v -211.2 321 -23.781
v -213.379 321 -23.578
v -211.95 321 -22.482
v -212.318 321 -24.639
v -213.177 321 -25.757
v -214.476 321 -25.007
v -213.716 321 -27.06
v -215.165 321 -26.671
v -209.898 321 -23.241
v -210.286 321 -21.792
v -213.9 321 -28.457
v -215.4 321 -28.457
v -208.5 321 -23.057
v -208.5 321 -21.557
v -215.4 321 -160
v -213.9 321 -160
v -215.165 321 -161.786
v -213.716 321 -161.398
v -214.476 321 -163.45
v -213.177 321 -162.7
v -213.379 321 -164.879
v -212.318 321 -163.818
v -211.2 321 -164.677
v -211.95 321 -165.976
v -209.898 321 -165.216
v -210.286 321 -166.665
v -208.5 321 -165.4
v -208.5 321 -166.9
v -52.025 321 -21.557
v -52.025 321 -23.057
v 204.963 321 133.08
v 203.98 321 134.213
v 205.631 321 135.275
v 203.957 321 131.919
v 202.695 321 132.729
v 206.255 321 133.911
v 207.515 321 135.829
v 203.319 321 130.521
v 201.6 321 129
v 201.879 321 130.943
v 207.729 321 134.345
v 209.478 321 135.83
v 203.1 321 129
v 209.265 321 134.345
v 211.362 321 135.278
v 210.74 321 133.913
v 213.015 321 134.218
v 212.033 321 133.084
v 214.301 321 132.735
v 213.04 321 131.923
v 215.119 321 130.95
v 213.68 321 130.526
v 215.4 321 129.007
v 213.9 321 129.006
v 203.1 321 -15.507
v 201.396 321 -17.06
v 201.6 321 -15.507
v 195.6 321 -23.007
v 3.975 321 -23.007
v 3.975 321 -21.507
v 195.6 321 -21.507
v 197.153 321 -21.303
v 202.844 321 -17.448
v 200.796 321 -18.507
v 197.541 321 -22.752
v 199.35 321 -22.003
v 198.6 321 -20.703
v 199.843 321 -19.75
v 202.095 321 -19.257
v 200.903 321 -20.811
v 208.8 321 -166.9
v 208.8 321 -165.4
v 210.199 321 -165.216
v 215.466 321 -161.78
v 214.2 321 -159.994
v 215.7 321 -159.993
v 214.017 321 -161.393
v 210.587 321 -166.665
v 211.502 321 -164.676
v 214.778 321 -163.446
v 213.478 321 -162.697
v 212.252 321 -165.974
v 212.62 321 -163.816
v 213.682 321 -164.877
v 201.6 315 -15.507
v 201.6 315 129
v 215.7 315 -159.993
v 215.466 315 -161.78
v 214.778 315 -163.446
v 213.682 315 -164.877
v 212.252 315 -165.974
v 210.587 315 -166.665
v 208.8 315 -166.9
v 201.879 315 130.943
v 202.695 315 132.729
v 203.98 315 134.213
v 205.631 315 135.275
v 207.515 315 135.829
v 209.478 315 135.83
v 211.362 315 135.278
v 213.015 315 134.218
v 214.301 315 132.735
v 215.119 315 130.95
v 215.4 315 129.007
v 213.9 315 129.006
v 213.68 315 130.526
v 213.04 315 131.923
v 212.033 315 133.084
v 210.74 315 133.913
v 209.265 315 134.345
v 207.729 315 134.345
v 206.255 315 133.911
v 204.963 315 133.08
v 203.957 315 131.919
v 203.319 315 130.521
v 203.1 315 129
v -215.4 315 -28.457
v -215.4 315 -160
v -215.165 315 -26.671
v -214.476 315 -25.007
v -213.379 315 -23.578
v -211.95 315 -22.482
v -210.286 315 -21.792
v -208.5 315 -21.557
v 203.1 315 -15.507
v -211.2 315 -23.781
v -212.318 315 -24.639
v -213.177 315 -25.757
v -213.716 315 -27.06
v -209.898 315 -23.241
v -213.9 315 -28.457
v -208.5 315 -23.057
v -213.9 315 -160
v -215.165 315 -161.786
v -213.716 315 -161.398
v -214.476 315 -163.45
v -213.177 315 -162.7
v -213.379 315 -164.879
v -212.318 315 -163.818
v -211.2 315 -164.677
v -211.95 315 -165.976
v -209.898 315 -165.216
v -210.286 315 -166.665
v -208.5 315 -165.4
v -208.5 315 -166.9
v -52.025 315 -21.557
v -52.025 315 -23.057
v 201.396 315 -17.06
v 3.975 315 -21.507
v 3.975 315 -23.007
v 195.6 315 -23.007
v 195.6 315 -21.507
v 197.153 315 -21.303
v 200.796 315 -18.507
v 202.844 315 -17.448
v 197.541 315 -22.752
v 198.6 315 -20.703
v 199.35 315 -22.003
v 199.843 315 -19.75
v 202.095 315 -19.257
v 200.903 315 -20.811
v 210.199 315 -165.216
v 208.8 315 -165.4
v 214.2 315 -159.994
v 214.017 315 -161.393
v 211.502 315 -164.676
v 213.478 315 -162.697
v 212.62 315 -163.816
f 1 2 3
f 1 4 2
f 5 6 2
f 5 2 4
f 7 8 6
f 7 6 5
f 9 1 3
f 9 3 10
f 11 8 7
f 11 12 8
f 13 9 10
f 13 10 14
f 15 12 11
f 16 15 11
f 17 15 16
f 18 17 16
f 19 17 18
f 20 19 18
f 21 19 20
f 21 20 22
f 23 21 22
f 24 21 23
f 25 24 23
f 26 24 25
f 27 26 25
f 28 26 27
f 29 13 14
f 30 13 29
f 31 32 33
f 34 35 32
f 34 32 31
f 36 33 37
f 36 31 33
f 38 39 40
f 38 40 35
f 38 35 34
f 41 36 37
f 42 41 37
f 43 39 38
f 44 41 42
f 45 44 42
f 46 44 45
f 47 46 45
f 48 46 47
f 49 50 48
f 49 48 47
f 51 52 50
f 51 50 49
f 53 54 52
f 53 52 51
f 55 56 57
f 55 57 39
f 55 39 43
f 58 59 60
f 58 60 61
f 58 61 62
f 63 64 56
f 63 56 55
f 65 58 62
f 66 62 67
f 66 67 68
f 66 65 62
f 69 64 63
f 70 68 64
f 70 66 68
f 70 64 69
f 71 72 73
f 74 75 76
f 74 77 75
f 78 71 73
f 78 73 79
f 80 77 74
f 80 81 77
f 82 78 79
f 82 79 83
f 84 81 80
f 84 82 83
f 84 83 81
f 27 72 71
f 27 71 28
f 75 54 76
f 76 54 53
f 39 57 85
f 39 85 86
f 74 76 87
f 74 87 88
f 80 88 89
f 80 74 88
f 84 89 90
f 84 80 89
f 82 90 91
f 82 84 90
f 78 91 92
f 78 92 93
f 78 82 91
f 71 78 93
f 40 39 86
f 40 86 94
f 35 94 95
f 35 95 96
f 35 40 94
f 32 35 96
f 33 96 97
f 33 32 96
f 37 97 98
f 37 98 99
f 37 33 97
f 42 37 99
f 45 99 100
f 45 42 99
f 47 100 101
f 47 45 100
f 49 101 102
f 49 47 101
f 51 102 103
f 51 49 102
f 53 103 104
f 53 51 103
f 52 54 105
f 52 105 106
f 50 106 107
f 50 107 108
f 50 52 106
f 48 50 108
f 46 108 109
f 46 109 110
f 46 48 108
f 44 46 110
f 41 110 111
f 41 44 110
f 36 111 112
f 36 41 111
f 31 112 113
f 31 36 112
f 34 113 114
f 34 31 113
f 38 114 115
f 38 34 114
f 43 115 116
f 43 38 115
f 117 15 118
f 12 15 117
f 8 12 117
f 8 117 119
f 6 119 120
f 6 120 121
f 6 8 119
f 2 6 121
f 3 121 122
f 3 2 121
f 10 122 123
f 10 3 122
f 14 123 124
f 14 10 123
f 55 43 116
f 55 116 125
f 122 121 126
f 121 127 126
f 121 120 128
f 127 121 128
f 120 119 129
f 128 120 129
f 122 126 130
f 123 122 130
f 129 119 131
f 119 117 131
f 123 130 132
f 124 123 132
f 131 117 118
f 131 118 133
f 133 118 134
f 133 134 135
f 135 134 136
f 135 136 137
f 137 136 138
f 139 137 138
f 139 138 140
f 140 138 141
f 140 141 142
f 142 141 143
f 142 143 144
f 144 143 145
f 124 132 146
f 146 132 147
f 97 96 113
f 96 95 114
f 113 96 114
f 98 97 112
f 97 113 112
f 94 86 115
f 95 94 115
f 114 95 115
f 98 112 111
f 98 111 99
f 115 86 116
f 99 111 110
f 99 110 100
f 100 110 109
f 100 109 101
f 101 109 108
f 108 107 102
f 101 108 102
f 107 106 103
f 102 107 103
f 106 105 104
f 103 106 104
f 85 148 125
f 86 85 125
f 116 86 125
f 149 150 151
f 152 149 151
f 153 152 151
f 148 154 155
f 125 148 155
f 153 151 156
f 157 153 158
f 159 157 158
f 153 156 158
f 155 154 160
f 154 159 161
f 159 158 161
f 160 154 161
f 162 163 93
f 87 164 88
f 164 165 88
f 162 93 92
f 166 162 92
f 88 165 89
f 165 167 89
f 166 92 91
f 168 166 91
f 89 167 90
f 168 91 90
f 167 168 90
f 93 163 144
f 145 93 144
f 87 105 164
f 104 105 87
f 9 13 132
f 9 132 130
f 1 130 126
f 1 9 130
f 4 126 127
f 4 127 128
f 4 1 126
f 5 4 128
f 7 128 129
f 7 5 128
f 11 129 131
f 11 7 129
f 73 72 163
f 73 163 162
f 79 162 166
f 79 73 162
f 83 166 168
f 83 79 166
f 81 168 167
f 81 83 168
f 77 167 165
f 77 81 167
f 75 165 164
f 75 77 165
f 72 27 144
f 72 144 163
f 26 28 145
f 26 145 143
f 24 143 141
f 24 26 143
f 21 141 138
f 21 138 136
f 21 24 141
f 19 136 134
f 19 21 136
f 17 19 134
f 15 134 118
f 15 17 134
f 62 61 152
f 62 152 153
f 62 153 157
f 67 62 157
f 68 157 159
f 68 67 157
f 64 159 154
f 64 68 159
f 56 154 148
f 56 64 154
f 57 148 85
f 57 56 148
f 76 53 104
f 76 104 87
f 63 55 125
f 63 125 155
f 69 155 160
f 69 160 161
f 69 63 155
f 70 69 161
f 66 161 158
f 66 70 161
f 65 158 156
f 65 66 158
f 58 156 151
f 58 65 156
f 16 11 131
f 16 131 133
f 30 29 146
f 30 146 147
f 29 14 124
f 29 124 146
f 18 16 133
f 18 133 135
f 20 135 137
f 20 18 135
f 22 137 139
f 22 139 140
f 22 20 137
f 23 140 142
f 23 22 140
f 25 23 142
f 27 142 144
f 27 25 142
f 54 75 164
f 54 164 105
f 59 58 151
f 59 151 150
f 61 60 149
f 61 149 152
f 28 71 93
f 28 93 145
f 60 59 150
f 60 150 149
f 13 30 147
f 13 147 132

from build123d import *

# Parameters (mm, degrees)
BOSS_EXTRUDE1_DEPTH = 6


with BuildPart() as part:
    # Sketch1 → Boss-Extrude1 (new body)
    with BuildSketch(Plane(origin=(0, 321, 0), x_dir=(1, 0, 0), z_dir=(0, 1, 0))):
        with BuildLine():
            Line((195.6, 23.007337011), (3.974945104, 23.007337011))
            Line((3.974945104, 23.007337011), (3.974945104, 21.507337011))
            Line((3.974945104, 21.507337011), (195.6, 21.507337011))
            ThreePointArc((195.6, 21.507337011), (199.842640687, 19.749977698), (201.6, 15.507337011))
            Line((201.6, 15.507337011), (201.6, -129))
            ThreePointArc((201.6, -129), (208.496418687, -135.899999071), (215.399996282, -129.007162626))
            Line((215.399996282, -129.007162626), (215.699996282, 159.992837374))
            ThreePointArc((215.699996282, 159.992837374), (213.681568504, 164.876503762), (208.8, 166.9))
            Line((208.8, 166.9), (-208.5, 166.9))
            ThreePointArc((-208.5, 166.9), (-213.37903679, 164.87903679), (-215.4, 160))
            Line((-215.4, 160), (-215.4, 28.457337011))
            ThreePointArc((-215.4, 28.457337011), (-213.37903679, 23.578300221), (-208.5, 21.557337011))
            Line((-208.5, 21.557337011), (-52.025054896, 21.557337011))
            Line((-52.025054896, 21.557337011), (-52.025054896, 23.057337011))
            Line((-52.025054896, 23.057337011), (-208.5, 23.057337011))
            ThreePointArc((-208.5, 23.057337011), (-212.318376618, 24.638960392), (-213.9, 28.457337011))
            Line((-213.9, 28.457337011), (-213.9, 160))
            ThreePointArc((-213.9, 160), (-212.318376618, 163.818376618), (-208.5, 165.4))
            Line((-208.5, 165.4), (208.8, 165.4))
            ThreePointArc((208.8, 165.4), (212.62035796, 163.816394249), (214.199997091, 159.994394467))
            Line((214.199997091, 159.994394467), (213.899997091, -129.005605533))
            ThreePointArc((213.899997091, -129.005605533), (208.497197233, -134.399999273), (203.1, -129))
            Line((203.1, -129), (203.1, 15.507337011))
            ThreePointArc((203.1, 15.507337011), (200.903300859, 20.81063787), (195.6, 23.007337011))
        make_face()
    extrude(amount=-BOSS_EXTRUDE1_DEPTH)


solid = part.part
